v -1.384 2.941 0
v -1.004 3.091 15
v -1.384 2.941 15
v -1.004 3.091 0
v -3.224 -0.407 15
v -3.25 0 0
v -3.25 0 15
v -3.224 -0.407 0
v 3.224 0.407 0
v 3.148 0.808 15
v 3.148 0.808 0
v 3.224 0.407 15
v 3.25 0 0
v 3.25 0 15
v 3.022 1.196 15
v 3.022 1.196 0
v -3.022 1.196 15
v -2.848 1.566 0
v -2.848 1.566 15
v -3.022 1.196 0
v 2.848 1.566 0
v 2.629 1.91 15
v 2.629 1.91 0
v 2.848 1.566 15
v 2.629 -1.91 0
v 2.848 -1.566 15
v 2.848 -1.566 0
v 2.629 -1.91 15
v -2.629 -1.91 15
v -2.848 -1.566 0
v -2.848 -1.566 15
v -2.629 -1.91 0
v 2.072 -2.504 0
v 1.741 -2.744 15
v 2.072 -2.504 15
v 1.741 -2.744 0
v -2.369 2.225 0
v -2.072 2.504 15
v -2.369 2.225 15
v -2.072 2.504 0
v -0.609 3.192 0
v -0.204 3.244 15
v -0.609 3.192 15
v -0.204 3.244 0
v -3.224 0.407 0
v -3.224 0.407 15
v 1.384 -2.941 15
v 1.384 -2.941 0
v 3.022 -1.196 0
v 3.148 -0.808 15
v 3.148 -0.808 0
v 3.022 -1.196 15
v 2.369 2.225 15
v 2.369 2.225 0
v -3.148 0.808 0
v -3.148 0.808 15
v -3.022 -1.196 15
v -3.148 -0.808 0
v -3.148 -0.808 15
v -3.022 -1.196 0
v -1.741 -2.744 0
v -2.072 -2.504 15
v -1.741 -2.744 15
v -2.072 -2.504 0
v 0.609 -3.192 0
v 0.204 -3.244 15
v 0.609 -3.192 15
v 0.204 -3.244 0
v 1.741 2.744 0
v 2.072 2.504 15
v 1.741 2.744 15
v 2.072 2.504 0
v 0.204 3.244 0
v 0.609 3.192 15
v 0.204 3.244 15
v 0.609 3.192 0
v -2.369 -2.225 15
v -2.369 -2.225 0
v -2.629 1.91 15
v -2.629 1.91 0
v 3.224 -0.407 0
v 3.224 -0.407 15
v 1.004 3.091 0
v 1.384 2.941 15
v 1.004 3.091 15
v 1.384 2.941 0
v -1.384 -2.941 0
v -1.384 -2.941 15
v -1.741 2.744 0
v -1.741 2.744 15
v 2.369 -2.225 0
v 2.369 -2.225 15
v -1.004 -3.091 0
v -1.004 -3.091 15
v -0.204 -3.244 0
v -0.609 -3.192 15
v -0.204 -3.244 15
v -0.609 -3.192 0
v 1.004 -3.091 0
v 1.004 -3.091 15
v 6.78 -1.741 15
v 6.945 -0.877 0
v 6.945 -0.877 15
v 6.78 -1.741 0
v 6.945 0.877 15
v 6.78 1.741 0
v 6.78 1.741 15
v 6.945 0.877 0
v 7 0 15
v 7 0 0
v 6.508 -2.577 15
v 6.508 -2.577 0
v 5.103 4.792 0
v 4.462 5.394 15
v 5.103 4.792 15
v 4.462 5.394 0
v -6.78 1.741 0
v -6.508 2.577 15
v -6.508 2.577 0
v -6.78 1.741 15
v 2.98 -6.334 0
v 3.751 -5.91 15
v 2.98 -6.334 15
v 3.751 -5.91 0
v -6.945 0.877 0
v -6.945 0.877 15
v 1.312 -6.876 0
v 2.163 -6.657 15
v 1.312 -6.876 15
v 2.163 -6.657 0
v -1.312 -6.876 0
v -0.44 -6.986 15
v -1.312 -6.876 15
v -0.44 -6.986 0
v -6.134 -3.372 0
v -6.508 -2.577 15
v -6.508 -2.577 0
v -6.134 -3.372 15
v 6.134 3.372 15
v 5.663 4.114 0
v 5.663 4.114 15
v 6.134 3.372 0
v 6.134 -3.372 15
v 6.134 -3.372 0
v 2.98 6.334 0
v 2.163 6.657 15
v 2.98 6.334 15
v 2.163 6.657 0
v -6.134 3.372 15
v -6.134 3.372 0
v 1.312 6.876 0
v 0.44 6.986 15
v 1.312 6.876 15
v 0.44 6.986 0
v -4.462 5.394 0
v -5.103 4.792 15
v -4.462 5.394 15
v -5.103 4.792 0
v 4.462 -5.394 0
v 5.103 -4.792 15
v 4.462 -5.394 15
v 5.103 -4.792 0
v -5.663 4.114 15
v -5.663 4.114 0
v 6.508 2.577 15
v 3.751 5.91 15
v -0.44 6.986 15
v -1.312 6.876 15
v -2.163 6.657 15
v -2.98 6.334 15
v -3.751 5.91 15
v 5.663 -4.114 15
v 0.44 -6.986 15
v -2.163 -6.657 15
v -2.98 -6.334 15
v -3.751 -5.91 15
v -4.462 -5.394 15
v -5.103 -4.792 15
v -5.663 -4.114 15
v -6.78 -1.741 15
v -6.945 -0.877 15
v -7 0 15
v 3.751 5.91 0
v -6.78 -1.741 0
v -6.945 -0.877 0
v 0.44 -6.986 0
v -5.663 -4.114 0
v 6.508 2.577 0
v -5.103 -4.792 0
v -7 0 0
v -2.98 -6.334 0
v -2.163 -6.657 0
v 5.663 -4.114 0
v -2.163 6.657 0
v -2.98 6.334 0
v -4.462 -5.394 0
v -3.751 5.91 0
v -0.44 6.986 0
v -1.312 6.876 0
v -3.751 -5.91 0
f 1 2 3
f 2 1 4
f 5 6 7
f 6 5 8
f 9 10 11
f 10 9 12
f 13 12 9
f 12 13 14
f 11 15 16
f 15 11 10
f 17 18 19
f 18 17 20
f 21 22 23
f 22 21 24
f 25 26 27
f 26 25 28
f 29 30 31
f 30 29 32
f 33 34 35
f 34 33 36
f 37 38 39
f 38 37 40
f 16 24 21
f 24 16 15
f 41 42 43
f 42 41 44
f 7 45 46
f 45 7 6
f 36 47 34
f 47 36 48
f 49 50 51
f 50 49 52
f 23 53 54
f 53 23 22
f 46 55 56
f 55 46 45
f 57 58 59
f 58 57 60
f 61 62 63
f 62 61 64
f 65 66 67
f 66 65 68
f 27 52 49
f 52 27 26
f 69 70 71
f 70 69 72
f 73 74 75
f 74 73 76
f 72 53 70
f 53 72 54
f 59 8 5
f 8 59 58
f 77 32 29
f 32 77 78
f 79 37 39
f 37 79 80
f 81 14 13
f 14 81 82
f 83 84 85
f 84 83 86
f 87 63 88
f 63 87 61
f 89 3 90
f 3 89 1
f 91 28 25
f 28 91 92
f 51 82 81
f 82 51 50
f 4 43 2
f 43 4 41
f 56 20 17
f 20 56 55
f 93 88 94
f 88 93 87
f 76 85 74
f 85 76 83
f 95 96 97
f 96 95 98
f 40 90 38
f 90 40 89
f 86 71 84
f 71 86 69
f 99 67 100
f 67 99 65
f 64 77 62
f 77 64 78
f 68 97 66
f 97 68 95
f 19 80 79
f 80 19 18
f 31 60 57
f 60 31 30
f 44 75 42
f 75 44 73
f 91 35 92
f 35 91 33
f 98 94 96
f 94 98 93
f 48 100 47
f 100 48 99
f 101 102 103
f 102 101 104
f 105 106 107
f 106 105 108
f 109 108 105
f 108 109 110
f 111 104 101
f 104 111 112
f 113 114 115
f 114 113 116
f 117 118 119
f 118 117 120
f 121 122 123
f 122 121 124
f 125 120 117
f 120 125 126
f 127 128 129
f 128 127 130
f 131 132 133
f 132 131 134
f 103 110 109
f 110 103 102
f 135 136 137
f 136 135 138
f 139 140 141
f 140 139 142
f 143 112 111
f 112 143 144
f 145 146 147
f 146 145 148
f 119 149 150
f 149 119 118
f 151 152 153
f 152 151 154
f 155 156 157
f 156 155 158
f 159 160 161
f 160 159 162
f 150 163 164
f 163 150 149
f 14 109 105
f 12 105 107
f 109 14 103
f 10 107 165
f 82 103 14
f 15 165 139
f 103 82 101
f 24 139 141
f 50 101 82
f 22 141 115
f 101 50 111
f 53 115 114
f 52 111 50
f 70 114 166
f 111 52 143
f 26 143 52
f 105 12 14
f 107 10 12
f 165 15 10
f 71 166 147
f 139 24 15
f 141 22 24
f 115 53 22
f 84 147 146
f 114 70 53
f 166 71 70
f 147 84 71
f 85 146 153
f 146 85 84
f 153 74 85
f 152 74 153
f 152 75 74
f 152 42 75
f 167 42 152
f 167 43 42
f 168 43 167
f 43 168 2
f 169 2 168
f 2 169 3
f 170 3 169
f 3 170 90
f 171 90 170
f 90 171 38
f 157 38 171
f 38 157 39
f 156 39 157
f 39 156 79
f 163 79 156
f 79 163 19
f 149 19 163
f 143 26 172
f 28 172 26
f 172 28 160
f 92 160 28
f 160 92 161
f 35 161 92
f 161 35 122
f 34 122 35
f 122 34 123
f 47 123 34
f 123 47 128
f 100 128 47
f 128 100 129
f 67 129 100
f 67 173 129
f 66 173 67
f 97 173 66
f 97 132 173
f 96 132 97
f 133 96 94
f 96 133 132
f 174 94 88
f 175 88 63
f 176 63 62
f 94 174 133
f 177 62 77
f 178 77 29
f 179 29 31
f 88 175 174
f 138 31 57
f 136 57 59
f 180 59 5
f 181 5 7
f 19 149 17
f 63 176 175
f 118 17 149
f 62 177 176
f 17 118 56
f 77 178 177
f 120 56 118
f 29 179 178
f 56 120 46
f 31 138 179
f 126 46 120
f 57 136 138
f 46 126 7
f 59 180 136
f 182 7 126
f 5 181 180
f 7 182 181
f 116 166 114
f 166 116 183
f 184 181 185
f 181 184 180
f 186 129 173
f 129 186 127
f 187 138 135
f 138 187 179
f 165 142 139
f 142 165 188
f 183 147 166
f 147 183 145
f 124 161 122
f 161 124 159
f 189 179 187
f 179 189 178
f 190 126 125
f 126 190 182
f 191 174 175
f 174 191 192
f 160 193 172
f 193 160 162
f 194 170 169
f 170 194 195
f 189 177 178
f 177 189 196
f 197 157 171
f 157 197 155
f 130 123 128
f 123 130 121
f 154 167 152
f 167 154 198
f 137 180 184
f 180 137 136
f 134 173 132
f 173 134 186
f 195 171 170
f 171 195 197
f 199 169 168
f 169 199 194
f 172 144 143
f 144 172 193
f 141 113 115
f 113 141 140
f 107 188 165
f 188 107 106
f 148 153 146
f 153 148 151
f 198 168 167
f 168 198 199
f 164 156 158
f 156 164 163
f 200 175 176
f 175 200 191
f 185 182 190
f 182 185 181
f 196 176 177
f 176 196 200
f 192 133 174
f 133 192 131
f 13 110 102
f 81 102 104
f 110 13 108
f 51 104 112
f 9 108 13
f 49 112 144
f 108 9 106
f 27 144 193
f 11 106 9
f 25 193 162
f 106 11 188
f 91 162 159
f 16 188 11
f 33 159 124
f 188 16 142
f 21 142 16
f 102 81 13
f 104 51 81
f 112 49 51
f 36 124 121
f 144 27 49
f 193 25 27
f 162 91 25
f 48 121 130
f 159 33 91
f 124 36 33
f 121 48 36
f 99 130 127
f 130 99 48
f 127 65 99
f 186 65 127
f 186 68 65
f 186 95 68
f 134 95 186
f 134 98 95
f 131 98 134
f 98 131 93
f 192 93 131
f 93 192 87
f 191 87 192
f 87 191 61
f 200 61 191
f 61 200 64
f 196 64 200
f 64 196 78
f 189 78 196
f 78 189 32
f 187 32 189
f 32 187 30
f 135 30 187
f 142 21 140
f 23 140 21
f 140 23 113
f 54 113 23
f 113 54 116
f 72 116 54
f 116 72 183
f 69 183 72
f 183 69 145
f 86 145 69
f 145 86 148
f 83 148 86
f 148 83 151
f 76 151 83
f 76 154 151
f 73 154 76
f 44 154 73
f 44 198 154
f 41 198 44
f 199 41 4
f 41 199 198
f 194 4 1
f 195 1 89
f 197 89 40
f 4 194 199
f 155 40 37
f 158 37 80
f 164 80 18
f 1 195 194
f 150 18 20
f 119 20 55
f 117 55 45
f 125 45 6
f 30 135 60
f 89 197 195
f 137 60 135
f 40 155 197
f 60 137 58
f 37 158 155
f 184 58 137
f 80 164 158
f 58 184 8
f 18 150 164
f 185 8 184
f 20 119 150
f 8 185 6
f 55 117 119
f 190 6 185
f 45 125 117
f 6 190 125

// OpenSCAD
$fn = 50;


difference() {
	union() {
		*color(alpha = 1.0000000000, c = "gray") {
			translate(v = [0, 7, 0]) {
				linear_extrude(height = 1) {
					text(font = "Arial:style=Bold", halign = "center", size = 4.5000000000, text = "COMMENT plate main", valign = "center");
				}
			}
		}
		*color(alpha = 1.0000000000, c = "gray") {
			translate(v = [0, 14, 0]) {
				linear_extrude(height = 1) {
					text(font = "Arial:style=Bold", halign = "center", size = 4.5000000000, text = "COMMENT description oobb_plate_shape_p_type_15_depth_1_width_1_height_15_thickness_true_both_holes", valign = "center");
				}
			}
		}
		cylinder(h = 15, r = 7.0000000000);
	}
	union() {
		*color(alpha = 1.0000000000, c = "gray") {
			translate(v = [0, 7, 0]) {
				linear_extrude(height = 1) {
					text(font = "Arial:style=Bold", halign = "center", size = 4.5000000000, text = "COMMENT holes main", valign = "center");
				}
			}
		}
		*color(alpha = 1.0000000000, c = "gray") {
			translate(v = [0, 14, 0]) {
				linear_extrude(height = 1) {
					text(font = "Arial:style=Bold", halign = "center", size = 4.5000000000, text = "COMMENT description oobb_holes_shape_n_type_1_width_1_height_15_thickness_true_both_holes", valign = "center");
				}
			}
		}
		translate(v = [0, 0, -50]) {
			cylinder(h = 100, r = 3.2500000000);
		}
		translate(v = [0, 0, -50]) {
			cylinder(h = 100, r = 1.8000000000);
		}
	}
}
